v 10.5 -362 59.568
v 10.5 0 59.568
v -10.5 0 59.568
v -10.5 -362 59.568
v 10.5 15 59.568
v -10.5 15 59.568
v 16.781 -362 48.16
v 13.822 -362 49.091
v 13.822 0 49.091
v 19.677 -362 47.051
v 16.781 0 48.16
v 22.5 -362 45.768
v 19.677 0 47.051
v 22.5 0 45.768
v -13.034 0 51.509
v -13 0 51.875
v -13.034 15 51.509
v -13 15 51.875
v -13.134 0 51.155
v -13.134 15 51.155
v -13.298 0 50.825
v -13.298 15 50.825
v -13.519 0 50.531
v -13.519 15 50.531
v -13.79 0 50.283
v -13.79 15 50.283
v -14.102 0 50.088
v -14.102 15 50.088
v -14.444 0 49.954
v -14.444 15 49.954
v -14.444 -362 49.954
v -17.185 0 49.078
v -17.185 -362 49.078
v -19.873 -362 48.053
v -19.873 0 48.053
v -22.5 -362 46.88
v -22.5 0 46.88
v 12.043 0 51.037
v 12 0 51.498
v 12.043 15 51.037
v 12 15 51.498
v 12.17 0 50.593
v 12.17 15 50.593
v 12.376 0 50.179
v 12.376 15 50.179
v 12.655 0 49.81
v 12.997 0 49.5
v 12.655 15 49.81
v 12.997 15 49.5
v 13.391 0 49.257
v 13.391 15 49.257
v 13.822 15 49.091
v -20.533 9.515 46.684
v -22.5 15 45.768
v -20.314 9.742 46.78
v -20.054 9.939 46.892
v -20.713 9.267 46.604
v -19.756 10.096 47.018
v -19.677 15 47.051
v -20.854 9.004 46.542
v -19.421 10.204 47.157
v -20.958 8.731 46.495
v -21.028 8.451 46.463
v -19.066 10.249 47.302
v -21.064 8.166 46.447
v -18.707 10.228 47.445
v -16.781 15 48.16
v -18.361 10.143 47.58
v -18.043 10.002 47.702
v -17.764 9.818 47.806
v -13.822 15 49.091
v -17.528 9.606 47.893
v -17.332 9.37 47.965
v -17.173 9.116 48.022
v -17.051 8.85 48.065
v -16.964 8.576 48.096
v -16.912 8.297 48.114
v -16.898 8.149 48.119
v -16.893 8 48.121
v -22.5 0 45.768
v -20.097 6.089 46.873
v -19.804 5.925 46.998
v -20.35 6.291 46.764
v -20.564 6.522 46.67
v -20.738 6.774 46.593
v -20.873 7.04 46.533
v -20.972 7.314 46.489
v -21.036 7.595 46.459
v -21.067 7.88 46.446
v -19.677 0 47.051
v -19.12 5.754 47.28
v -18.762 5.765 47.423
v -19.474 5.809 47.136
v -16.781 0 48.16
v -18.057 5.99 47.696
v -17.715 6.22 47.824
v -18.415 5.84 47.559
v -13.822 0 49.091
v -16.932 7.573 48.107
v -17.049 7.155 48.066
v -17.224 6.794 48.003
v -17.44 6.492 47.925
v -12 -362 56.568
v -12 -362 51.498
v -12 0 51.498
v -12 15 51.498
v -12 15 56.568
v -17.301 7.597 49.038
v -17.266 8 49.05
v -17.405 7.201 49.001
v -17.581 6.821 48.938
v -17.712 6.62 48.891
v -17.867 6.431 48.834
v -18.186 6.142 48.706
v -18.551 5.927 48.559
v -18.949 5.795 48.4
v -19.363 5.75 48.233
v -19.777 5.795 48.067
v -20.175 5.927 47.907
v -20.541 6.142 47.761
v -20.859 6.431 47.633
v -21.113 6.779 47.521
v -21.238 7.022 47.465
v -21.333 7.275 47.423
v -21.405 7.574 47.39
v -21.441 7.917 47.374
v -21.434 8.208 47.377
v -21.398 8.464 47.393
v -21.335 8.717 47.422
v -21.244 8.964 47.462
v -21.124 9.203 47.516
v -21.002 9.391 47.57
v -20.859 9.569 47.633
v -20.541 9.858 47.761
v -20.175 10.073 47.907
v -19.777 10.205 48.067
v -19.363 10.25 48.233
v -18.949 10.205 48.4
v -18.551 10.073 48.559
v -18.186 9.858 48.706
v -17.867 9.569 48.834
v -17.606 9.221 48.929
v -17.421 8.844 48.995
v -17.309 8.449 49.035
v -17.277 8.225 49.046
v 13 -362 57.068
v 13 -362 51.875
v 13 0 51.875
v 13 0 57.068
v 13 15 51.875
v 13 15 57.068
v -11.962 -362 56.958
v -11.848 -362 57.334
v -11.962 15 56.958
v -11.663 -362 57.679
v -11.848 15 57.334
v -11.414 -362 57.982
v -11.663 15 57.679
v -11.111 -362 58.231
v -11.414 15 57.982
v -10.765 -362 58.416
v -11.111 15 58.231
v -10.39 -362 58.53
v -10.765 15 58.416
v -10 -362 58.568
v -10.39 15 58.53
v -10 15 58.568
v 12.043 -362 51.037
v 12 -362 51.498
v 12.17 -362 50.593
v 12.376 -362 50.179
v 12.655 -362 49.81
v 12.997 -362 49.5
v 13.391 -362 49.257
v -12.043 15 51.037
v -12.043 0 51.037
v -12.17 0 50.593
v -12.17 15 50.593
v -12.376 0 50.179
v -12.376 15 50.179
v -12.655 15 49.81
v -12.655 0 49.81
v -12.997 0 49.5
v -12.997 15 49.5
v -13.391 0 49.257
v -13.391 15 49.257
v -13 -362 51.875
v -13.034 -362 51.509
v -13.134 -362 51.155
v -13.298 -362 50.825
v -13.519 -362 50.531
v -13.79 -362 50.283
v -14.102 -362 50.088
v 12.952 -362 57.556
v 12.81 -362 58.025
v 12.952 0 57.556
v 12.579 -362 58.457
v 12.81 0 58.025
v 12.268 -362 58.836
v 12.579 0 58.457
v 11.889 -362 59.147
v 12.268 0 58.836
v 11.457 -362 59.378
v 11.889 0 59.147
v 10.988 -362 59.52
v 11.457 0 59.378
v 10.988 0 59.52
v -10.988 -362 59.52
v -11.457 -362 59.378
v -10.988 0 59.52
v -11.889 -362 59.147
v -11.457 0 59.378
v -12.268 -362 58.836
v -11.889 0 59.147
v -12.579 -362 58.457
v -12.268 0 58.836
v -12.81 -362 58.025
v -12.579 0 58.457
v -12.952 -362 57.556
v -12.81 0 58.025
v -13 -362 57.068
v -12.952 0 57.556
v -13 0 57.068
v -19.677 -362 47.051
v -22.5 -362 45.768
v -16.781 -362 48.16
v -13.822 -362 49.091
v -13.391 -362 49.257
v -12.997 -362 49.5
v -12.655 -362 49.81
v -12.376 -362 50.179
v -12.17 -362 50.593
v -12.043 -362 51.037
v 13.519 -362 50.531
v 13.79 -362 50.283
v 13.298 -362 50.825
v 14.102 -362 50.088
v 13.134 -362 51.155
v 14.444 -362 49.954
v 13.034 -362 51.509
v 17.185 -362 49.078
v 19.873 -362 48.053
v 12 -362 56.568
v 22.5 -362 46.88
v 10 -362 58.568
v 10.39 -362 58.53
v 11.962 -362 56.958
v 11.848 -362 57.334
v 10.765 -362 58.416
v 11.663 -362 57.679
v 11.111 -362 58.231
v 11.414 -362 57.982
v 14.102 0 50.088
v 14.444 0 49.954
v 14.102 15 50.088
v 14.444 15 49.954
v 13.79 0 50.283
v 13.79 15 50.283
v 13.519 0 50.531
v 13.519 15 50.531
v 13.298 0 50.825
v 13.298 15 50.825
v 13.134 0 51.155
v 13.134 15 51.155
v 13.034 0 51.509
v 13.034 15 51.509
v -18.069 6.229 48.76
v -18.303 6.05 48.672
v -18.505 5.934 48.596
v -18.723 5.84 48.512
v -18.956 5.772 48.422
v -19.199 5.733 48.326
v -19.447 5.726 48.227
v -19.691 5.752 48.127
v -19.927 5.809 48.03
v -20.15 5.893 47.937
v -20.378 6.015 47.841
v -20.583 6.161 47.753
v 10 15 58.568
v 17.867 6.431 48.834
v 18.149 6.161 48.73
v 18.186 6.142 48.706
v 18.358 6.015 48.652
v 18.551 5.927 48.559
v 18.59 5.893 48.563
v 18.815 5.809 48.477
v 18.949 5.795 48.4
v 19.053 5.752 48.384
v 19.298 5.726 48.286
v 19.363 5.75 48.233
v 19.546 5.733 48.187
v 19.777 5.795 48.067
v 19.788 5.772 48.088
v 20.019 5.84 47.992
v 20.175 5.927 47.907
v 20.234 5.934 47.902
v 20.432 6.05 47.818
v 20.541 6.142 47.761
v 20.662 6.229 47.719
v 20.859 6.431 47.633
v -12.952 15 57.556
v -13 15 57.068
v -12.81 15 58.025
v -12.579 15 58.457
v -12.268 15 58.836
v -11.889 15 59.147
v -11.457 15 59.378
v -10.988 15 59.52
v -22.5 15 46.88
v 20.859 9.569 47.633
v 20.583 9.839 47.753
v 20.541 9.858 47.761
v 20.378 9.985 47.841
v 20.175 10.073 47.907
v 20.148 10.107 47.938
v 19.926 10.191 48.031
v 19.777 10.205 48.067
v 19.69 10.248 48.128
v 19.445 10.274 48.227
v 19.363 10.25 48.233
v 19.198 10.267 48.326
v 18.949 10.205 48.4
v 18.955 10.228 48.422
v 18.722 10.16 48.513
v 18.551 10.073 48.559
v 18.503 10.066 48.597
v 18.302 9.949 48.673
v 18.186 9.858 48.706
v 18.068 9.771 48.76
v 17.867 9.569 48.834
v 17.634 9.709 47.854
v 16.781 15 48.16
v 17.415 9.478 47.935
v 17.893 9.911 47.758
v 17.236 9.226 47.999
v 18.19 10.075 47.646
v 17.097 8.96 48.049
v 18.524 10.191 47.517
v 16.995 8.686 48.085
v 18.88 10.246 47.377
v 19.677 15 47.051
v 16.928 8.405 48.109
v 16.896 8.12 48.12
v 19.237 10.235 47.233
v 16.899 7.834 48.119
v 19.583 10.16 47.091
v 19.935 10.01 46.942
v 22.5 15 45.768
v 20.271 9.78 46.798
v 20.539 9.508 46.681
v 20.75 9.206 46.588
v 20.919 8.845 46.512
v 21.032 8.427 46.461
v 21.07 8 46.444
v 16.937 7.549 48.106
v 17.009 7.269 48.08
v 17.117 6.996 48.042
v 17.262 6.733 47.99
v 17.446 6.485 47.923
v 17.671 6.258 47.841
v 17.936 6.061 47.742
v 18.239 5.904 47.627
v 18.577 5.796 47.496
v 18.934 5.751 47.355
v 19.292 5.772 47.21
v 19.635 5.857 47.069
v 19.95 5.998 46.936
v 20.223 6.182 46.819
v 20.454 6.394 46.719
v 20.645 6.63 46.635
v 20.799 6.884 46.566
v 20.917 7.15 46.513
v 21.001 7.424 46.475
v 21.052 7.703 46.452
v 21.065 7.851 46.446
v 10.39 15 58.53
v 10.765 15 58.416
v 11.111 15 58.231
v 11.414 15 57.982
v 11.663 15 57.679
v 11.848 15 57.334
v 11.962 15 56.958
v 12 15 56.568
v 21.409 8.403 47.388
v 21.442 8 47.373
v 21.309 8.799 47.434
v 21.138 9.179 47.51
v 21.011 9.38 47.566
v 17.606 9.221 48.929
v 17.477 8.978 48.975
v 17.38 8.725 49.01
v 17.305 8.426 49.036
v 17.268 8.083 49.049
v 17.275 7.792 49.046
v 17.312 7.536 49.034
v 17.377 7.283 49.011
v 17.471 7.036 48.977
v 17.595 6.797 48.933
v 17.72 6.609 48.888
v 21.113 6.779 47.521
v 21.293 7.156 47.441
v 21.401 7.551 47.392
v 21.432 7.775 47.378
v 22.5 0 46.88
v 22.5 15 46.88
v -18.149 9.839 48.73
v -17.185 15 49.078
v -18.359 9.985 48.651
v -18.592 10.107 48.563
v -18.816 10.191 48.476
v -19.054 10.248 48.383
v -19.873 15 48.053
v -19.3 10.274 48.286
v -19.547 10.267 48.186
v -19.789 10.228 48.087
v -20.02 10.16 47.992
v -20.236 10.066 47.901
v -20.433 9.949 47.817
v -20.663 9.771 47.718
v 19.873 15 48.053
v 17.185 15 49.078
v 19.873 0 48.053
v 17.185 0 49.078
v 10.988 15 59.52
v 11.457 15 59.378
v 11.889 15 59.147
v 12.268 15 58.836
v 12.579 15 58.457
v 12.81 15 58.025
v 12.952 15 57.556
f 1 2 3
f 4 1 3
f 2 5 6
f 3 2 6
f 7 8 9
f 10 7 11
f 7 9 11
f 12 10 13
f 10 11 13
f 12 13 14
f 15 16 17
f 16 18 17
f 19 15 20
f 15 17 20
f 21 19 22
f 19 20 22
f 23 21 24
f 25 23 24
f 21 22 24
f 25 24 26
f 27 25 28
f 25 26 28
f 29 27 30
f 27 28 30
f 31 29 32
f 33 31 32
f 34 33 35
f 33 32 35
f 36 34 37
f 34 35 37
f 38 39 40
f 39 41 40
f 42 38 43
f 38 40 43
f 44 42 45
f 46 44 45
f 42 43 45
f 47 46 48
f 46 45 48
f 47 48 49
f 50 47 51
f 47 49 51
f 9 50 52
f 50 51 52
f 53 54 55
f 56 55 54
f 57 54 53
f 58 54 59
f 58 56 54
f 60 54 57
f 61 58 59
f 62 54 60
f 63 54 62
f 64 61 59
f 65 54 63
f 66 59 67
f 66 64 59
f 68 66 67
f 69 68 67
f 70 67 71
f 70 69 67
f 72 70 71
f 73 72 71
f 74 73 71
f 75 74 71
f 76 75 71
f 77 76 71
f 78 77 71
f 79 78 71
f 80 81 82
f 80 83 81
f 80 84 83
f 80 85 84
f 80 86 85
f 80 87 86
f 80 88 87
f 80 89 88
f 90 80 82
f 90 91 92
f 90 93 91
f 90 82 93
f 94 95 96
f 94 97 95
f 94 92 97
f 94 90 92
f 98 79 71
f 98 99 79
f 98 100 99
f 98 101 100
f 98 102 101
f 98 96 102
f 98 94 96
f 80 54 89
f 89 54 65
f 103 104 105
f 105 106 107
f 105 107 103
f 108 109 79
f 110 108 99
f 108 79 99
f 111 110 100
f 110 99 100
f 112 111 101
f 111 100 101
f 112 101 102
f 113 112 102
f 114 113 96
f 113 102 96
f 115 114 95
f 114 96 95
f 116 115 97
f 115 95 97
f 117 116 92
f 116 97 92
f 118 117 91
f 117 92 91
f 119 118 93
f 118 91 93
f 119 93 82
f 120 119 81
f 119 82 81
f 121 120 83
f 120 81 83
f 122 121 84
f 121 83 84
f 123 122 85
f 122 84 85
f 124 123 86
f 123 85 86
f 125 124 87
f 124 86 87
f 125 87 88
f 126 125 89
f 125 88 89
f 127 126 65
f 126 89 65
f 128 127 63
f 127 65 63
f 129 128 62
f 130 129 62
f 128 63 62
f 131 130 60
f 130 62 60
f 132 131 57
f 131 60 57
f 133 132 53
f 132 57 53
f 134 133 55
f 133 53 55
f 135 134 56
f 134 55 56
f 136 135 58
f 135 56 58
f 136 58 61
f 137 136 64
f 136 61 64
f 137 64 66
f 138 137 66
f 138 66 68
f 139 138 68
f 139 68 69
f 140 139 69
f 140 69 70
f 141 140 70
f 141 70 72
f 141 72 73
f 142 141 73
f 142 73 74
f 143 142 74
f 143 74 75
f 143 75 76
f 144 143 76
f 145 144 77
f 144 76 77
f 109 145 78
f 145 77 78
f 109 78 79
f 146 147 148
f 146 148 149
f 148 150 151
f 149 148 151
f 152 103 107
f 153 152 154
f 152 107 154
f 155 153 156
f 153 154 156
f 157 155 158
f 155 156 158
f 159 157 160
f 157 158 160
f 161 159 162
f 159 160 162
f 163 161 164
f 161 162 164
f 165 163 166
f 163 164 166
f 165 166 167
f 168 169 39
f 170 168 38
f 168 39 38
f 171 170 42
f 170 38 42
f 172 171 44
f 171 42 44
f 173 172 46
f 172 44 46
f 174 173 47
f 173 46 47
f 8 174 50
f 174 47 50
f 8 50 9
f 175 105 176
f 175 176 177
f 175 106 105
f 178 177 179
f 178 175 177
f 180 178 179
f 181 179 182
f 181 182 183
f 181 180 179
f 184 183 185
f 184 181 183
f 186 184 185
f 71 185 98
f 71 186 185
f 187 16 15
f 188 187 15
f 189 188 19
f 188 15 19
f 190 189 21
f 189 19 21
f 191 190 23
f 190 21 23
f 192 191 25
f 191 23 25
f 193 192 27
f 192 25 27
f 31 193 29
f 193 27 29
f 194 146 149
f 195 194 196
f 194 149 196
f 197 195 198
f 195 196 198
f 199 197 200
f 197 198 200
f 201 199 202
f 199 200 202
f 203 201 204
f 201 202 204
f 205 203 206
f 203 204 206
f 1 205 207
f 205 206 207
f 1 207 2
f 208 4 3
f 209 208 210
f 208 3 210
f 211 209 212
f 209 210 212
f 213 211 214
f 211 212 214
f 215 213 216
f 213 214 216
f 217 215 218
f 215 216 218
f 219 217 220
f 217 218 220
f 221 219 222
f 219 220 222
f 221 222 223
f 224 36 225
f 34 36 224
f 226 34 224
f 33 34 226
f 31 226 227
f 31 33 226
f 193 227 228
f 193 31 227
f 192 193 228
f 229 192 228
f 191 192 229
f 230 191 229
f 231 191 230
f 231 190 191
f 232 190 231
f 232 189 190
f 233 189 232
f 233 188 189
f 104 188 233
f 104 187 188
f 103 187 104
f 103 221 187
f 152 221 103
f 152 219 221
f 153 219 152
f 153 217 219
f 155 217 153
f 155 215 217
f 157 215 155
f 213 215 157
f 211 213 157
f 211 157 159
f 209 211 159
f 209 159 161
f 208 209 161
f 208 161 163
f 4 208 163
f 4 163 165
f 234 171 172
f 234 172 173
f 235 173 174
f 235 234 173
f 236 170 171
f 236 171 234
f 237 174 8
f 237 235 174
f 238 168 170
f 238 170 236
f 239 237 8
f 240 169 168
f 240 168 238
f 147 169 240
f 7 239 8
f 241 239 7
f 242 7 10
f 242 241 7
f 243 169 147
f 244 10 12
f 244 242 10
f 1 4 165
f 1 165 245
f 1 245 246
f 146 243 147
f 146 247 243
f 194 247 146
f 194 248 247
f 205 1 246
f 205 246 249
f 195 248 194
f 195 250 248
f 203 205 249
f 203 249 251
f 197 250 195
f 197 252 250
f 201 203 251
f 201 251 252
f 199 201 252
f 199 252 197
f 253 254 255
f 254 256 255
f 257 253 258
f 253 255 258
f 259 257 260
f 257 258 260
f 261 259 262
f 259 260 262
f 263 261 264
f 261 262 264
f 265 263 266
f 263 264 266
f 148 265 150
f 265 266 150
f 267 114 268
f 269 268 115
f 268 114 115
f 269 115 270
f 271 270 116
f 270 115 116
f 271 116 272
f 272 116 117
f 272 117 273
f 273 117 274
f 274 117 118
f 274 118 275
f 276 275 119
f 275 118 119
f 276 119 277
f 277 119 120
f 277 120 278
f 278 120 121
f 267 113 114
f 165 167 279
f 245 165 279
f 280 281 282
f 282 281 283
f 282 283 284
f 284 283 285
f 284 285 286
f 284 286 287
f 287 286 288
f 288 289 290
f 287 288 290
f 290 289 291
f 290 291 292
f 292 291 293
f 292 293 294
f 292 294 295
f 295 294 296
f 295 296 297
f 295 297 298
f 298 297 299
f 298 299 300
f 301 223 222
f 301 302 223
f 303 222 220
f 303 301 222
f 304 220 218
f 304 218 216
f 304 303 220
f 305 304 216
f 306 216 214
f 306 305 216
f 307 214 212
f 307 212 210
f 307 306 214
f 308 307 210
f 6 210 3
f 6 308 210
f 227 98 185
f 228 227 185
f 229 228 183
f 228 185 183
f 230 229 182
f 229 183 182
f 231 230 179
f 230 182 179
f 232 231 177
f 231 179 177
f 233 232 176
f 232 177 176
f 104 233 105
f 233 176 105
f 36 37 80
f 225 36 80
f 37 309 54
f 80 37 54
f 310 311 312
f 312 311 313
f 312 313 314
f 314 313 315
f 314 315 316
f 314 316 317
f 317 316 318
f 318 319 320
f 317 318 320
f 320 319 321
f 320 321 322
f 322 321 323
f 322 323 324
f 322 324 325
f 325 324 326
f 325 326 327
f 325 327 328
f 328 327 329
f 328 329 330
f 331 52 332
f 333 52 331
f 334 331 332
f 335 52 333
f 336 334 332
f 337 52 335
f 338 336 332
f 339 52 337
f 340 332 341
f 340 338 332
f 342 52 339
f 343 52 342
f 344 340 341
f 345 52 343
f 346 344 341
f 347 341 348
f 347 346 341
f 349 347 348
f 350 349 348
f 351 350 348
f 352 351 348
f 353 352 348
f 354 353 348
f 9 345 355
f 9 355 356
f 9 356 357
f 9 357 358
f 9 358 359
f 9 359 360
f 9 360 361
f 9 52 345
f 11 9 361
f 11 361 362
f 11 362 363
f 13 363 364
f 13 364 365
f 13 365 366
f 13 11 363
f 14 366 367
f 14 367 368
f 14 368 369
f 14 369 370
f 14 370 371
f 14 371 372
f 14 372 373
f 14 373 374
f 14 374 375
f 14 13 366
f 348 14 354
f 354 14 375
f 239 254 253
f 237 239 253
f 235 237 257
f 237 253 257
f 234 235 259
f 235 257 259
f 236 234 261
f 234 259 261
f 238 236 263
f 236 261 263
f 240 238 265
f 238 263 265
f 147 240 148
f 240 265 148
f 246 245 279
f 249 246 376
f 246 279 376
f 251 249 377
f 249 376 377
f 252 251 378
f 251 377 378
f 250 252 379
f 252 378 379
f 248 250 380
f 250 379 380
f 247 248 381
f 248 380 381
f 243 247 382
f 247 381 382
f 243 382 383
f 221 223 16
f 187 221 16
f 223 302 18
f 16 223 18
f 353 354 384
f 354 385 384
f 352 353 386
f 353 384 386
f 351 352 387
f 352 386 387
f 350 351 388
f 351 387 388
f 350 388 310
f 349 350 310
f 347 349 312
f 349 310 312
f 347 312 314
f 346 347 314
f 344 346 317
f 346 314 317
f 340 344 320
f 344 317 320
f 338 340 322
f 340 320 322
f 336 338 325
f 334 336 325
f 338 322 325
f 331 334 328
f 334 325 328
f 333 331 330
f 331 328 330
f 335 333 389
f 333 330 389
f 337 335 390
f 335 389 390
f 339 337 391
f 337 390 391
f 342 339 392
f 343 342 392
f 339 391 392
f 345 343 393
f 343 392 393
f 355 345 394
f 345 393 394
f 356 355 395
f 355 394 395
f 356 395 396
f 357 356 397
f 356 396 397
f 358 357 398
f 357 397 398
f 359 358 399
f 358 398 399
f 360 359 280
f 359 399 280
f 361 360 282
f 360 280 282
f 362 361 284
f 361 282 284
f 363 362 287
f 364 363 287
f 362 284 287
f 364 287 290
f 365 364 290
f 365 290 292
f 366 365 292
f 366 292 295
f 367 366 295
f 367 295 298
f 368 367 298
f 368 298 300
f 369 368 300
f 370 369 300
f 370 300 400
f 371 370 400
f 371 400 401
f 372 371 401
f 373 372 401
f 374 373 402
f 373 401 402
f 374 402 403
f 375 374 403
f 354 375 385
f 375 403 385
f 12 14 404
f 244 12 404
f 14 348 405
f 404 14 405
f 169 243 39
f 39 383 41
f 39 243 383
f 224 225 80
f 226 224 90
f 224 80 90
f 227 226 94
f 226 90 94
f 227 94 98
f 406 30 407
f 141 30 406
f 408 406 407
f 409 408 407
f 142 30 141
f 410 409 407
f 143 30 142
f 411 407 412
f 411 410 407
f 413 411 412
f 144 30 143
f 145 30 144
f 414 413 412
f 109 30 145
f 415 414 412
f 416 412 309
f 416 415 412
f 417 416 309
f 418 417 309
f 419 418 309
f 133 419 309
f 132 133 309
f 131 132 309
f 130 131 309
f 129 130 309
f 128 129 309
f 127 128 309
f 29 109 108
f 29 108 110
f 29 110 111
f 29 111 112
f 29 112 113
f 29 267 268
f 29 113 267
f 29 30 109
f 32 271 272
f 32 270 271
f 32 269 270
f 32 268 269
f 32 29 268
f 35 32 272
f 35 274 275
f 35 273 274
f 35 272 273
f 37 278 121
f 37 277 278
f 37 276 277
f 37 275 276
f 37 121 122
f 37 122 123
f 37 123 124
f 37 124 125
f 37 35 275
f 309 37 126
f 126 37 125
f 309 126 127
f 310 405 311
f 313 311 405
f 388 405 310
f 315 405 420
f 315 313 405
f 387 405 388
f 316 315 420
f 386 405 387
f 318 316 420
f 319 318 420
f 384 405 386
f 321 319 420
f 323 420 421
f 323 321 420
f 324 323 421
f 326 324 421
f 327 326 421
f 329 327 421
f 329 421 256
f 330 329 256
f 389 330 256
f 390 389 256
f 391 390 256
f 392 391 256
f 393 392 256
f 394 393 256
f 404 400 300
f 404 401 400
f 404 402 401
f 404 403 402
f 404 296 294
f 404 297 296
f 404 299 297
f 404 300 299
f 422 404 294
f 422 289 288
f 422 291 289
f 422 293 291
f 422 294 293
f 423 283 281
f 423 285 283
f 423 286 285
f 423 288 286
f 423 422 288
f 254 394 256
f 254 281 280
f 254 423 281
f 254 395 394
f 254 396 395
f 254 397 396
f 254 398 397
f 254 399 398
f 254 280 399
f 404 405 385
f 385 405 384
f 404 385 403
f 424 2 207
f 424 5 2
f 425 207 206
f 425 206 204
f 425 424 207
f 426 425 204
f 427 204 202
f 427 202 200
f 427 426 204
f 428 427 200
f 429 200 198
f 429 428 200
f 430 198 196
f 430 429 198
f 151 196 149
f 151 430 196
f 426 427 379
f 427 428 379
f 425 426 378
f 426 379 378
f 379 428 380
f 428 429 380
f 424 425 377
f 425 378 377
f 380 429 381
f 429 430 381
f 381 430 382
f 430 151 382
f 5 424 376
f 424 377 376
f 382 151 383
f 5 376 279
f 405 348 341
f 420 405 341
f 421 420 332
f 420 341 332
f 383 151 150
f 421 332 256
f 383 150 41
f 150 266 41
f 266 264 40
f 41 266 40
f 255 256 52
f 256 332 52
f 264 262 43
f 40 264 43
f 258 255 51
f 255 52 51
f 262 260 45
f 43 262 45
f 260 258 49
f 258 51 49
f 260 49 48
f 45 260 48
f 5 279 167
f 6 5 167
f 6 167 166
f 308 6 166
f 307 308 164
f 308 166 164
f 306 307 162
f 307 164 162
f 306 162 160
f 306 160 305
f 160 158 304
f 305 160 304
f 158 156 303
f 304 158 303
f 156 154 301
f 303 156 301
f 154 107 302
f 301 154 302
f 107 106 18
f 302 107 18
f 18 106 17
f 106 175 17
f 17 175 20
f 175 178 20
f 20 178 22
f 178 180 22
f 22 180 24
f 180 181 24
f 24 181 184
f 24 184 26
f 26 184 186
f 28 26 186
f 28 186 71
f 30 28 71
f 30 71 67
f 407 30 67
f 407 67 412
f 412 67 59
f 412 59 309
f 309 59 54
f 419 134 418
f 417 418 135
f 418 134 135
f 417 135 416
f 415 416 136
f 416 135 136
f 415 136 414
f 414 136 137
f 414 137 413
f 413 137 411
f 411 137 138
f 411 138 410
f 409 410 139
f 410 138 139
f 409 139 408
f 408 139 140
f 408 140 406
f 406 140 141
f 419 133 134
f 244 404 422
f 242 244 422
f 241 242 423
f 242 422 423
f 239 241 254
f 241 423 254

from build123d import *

# Parameters (mm, degrees)
EXTRUDE_1_DEPTH = 15
FILLET_1_R      = 2
FILLET_2_R      = 2.5
EXTRUDE_2_DEPTH = 362


# Read off the part's stored shape, not the designer's step: Отверстие с зазором M41
with BuildPart() as part:
    # Эскиз1 → Бобышка-Вытянуть1 (new body)
    with BuildSketch(Plane(origin=(0, 0, 0), x_dir=(1, 0, 0), z_dir=(0, 1, 0))):
        with BuildLine():
            Line((-22.5, -46.880166382), (-22.5, -45.768438907))
            ThreePointArc((-22.5, -45.768438907), (-17.354305588, -47.956522784), (-12, -49.568134926))
            Line((-12, -49.568134926), (-12, -58.568134926))
            Line((-12, -58.568134926), (12, -58.568134926))
            Line((12, -58.568134926), (12, -49.568134926))
            ThreePointArc((12, -49.568134926), (17.354305588, -47.956522784), (22.5, -45.768438907))
            Line((22.5, -45.768438907), (22.5, -46.880166382))
            ThreePointArc((22.5, -46.880166382), (17.834526239, -48.845979096), (13, -50.348783501))
            Line((13, -50.348783501), (13, -59.568134926))
            Line((13, -59.568134926), (-13, -59.568134926))
            Line((-13, -59.568134926), (-13, -50.348783501))
            ThreePointArc((-13, -50.348783501), (-17.834526239, -48.845979096), (-22.5, -46.880166382))
        make_face()
    extrude(amount=EXTRUDE_1_DEPTH)

    # Скругление1
    fillet_1_edges = [part.edges().sort_by_distance(p)[0] for p in [
        (-13, 7.5, 50.348783501),
        (13, 7.5, 50.348783501),
        (12, 7.5, 58.568134926),
        (-12, 7.5, 58.568134926),
    ]]
    fillet(fillet_1_edges, radius=FILLET_1_R)

    # Скругление2
    fillet_2_edges = [part.edges().sort_by_distance(p)[0] for p in [
        (-12, 7.5, 49.568134926),
        (-13, 7.5, 59.568134926),
        (13, 7.5, 59.568134926),
        (12, 7.5, 49.568134926),
    ]]
    fillet(fillet_2_edges, radius=FILLET_2_R)

    # Отверстие с зазором M41 outline → Отверстие с зазором M41 (revolve, cut)
    with BuildSketch(Plane(origin=(0, 8, 0), x_dir=(0.9280125149960182, 0, -0.37254901960784303), z_dir=(0, -1, 0))):
        Polygon((2.25, 52.000021479), (2.25, 51.975), (2.275021479, 52.000021479), align=None)
        Polygon((2.25, 50.950316764), (2.25, 51.975), (2.25, 52.000021479), (0, 52.000021479), (0, 50.950316764), align=None)
    revolve(axis=Axis((0, 8, 0), (0.37254901960784303, 0, 0.9280125149960182)), mode=Mode.SUBTRACT)

    # Hole Wizard M41 2 outline → Hole Wizard M41 2 (revolve, cut)
    with BuildSketch(Plane(origin=(0, 8, 0), x_dir=(0.9280125149960182, 0, 0.37254901960784303), z_dir=(0, 1, 0))):
        Polygon((2.25, -52.000019282), (2.25, -51.975), (2.25, -50.950316764), (0, -50.950316764), (0, -52.000019282), align=None)
        Polygon((2.275019282, -52.000019282), (2.249998249, -51.974998249), (2.25, -52.000019282), align=None)
    revolve(axis=Axis((0, 8, 0), (0.37254901960784303, 0, -0.9280125149960182)), mode=Mode.SUBTRACT)

    # Эскиз3 → Бобышка-Вытянуть2 (add)
    with BuildSketch(Plane.XZ):
        with BuildLine():
            Line((12, 56.568134926), (12, 51.497572758))
            ThreePointArc((12, 51.497572758), (12.507021672, 49.988255899), (13.822429907, 49.091144125))
            ThreePointArc((13.822429907, 49.091144125), (18.237045294, 47.627829878), (22.5, 45.768438907))
            Line((22.5, 45.768438907), (22.5, 46.880166382))
            ThreePointArc((22.5, 46.880166382), (18.536030559, 48.584108216), (14.444444444, 49.953558679))
            ThreePointArc((14.444444444, 49.953558679), (13.401389492, 50.672998972), (13, 51.874849397))
            Line((13, 51.874849397), (13, 57.068134926))
            ThreePointArc((13, 57.068134926), (12.267766953, 58.835901879), (10.5, 59.568134926))
            Line((10.5, 59.568134926), (-10.5, 59.568134926))
            ThreePointArc((-10.5, 59.568134926), (-12.267766953, 58.835901879), (-13, 57.068134926))
            Line((-13, 57.068134926), (-13, 51.874849397))
            ThreePointArc((-13, 51.874849397), (-13.401389492, 50.672998972), (-14.444444444, 49.953558679))
            ThreePointArc((-14.444444444, 49.953558679), (-18.536030559, 48.584108216), (-22.5, 46.880166382))
            Line((-22.5, 46.880166382), (-22.5, 45.768438907))
            ThreePointArc((-22.5, 45.768438907), (-18.237045294, 47.627829878), (-13.822429907, 49.091144125))
            ThreePointArc((-13.822429907, 49.091144125), (-12.507021672, 49.988255899), (-12, 51.497572758))
            Line((-12, 51.497572758), (-12, 56.568134926))
            ThreePointArc((-12, 56.568134926), (-11.414213562, 57.982348488), (-10, 58.568134926))
            Line((-10, 58.568134926), (10, 58.568134926))
            ThreePointArc((10, 58.568134926), (11.414213562, 57.982348488), (12, 56.568134926))
        make_face()
    extrude(amount=EXTRUDE_2_DEPTH)


solid = part.part
